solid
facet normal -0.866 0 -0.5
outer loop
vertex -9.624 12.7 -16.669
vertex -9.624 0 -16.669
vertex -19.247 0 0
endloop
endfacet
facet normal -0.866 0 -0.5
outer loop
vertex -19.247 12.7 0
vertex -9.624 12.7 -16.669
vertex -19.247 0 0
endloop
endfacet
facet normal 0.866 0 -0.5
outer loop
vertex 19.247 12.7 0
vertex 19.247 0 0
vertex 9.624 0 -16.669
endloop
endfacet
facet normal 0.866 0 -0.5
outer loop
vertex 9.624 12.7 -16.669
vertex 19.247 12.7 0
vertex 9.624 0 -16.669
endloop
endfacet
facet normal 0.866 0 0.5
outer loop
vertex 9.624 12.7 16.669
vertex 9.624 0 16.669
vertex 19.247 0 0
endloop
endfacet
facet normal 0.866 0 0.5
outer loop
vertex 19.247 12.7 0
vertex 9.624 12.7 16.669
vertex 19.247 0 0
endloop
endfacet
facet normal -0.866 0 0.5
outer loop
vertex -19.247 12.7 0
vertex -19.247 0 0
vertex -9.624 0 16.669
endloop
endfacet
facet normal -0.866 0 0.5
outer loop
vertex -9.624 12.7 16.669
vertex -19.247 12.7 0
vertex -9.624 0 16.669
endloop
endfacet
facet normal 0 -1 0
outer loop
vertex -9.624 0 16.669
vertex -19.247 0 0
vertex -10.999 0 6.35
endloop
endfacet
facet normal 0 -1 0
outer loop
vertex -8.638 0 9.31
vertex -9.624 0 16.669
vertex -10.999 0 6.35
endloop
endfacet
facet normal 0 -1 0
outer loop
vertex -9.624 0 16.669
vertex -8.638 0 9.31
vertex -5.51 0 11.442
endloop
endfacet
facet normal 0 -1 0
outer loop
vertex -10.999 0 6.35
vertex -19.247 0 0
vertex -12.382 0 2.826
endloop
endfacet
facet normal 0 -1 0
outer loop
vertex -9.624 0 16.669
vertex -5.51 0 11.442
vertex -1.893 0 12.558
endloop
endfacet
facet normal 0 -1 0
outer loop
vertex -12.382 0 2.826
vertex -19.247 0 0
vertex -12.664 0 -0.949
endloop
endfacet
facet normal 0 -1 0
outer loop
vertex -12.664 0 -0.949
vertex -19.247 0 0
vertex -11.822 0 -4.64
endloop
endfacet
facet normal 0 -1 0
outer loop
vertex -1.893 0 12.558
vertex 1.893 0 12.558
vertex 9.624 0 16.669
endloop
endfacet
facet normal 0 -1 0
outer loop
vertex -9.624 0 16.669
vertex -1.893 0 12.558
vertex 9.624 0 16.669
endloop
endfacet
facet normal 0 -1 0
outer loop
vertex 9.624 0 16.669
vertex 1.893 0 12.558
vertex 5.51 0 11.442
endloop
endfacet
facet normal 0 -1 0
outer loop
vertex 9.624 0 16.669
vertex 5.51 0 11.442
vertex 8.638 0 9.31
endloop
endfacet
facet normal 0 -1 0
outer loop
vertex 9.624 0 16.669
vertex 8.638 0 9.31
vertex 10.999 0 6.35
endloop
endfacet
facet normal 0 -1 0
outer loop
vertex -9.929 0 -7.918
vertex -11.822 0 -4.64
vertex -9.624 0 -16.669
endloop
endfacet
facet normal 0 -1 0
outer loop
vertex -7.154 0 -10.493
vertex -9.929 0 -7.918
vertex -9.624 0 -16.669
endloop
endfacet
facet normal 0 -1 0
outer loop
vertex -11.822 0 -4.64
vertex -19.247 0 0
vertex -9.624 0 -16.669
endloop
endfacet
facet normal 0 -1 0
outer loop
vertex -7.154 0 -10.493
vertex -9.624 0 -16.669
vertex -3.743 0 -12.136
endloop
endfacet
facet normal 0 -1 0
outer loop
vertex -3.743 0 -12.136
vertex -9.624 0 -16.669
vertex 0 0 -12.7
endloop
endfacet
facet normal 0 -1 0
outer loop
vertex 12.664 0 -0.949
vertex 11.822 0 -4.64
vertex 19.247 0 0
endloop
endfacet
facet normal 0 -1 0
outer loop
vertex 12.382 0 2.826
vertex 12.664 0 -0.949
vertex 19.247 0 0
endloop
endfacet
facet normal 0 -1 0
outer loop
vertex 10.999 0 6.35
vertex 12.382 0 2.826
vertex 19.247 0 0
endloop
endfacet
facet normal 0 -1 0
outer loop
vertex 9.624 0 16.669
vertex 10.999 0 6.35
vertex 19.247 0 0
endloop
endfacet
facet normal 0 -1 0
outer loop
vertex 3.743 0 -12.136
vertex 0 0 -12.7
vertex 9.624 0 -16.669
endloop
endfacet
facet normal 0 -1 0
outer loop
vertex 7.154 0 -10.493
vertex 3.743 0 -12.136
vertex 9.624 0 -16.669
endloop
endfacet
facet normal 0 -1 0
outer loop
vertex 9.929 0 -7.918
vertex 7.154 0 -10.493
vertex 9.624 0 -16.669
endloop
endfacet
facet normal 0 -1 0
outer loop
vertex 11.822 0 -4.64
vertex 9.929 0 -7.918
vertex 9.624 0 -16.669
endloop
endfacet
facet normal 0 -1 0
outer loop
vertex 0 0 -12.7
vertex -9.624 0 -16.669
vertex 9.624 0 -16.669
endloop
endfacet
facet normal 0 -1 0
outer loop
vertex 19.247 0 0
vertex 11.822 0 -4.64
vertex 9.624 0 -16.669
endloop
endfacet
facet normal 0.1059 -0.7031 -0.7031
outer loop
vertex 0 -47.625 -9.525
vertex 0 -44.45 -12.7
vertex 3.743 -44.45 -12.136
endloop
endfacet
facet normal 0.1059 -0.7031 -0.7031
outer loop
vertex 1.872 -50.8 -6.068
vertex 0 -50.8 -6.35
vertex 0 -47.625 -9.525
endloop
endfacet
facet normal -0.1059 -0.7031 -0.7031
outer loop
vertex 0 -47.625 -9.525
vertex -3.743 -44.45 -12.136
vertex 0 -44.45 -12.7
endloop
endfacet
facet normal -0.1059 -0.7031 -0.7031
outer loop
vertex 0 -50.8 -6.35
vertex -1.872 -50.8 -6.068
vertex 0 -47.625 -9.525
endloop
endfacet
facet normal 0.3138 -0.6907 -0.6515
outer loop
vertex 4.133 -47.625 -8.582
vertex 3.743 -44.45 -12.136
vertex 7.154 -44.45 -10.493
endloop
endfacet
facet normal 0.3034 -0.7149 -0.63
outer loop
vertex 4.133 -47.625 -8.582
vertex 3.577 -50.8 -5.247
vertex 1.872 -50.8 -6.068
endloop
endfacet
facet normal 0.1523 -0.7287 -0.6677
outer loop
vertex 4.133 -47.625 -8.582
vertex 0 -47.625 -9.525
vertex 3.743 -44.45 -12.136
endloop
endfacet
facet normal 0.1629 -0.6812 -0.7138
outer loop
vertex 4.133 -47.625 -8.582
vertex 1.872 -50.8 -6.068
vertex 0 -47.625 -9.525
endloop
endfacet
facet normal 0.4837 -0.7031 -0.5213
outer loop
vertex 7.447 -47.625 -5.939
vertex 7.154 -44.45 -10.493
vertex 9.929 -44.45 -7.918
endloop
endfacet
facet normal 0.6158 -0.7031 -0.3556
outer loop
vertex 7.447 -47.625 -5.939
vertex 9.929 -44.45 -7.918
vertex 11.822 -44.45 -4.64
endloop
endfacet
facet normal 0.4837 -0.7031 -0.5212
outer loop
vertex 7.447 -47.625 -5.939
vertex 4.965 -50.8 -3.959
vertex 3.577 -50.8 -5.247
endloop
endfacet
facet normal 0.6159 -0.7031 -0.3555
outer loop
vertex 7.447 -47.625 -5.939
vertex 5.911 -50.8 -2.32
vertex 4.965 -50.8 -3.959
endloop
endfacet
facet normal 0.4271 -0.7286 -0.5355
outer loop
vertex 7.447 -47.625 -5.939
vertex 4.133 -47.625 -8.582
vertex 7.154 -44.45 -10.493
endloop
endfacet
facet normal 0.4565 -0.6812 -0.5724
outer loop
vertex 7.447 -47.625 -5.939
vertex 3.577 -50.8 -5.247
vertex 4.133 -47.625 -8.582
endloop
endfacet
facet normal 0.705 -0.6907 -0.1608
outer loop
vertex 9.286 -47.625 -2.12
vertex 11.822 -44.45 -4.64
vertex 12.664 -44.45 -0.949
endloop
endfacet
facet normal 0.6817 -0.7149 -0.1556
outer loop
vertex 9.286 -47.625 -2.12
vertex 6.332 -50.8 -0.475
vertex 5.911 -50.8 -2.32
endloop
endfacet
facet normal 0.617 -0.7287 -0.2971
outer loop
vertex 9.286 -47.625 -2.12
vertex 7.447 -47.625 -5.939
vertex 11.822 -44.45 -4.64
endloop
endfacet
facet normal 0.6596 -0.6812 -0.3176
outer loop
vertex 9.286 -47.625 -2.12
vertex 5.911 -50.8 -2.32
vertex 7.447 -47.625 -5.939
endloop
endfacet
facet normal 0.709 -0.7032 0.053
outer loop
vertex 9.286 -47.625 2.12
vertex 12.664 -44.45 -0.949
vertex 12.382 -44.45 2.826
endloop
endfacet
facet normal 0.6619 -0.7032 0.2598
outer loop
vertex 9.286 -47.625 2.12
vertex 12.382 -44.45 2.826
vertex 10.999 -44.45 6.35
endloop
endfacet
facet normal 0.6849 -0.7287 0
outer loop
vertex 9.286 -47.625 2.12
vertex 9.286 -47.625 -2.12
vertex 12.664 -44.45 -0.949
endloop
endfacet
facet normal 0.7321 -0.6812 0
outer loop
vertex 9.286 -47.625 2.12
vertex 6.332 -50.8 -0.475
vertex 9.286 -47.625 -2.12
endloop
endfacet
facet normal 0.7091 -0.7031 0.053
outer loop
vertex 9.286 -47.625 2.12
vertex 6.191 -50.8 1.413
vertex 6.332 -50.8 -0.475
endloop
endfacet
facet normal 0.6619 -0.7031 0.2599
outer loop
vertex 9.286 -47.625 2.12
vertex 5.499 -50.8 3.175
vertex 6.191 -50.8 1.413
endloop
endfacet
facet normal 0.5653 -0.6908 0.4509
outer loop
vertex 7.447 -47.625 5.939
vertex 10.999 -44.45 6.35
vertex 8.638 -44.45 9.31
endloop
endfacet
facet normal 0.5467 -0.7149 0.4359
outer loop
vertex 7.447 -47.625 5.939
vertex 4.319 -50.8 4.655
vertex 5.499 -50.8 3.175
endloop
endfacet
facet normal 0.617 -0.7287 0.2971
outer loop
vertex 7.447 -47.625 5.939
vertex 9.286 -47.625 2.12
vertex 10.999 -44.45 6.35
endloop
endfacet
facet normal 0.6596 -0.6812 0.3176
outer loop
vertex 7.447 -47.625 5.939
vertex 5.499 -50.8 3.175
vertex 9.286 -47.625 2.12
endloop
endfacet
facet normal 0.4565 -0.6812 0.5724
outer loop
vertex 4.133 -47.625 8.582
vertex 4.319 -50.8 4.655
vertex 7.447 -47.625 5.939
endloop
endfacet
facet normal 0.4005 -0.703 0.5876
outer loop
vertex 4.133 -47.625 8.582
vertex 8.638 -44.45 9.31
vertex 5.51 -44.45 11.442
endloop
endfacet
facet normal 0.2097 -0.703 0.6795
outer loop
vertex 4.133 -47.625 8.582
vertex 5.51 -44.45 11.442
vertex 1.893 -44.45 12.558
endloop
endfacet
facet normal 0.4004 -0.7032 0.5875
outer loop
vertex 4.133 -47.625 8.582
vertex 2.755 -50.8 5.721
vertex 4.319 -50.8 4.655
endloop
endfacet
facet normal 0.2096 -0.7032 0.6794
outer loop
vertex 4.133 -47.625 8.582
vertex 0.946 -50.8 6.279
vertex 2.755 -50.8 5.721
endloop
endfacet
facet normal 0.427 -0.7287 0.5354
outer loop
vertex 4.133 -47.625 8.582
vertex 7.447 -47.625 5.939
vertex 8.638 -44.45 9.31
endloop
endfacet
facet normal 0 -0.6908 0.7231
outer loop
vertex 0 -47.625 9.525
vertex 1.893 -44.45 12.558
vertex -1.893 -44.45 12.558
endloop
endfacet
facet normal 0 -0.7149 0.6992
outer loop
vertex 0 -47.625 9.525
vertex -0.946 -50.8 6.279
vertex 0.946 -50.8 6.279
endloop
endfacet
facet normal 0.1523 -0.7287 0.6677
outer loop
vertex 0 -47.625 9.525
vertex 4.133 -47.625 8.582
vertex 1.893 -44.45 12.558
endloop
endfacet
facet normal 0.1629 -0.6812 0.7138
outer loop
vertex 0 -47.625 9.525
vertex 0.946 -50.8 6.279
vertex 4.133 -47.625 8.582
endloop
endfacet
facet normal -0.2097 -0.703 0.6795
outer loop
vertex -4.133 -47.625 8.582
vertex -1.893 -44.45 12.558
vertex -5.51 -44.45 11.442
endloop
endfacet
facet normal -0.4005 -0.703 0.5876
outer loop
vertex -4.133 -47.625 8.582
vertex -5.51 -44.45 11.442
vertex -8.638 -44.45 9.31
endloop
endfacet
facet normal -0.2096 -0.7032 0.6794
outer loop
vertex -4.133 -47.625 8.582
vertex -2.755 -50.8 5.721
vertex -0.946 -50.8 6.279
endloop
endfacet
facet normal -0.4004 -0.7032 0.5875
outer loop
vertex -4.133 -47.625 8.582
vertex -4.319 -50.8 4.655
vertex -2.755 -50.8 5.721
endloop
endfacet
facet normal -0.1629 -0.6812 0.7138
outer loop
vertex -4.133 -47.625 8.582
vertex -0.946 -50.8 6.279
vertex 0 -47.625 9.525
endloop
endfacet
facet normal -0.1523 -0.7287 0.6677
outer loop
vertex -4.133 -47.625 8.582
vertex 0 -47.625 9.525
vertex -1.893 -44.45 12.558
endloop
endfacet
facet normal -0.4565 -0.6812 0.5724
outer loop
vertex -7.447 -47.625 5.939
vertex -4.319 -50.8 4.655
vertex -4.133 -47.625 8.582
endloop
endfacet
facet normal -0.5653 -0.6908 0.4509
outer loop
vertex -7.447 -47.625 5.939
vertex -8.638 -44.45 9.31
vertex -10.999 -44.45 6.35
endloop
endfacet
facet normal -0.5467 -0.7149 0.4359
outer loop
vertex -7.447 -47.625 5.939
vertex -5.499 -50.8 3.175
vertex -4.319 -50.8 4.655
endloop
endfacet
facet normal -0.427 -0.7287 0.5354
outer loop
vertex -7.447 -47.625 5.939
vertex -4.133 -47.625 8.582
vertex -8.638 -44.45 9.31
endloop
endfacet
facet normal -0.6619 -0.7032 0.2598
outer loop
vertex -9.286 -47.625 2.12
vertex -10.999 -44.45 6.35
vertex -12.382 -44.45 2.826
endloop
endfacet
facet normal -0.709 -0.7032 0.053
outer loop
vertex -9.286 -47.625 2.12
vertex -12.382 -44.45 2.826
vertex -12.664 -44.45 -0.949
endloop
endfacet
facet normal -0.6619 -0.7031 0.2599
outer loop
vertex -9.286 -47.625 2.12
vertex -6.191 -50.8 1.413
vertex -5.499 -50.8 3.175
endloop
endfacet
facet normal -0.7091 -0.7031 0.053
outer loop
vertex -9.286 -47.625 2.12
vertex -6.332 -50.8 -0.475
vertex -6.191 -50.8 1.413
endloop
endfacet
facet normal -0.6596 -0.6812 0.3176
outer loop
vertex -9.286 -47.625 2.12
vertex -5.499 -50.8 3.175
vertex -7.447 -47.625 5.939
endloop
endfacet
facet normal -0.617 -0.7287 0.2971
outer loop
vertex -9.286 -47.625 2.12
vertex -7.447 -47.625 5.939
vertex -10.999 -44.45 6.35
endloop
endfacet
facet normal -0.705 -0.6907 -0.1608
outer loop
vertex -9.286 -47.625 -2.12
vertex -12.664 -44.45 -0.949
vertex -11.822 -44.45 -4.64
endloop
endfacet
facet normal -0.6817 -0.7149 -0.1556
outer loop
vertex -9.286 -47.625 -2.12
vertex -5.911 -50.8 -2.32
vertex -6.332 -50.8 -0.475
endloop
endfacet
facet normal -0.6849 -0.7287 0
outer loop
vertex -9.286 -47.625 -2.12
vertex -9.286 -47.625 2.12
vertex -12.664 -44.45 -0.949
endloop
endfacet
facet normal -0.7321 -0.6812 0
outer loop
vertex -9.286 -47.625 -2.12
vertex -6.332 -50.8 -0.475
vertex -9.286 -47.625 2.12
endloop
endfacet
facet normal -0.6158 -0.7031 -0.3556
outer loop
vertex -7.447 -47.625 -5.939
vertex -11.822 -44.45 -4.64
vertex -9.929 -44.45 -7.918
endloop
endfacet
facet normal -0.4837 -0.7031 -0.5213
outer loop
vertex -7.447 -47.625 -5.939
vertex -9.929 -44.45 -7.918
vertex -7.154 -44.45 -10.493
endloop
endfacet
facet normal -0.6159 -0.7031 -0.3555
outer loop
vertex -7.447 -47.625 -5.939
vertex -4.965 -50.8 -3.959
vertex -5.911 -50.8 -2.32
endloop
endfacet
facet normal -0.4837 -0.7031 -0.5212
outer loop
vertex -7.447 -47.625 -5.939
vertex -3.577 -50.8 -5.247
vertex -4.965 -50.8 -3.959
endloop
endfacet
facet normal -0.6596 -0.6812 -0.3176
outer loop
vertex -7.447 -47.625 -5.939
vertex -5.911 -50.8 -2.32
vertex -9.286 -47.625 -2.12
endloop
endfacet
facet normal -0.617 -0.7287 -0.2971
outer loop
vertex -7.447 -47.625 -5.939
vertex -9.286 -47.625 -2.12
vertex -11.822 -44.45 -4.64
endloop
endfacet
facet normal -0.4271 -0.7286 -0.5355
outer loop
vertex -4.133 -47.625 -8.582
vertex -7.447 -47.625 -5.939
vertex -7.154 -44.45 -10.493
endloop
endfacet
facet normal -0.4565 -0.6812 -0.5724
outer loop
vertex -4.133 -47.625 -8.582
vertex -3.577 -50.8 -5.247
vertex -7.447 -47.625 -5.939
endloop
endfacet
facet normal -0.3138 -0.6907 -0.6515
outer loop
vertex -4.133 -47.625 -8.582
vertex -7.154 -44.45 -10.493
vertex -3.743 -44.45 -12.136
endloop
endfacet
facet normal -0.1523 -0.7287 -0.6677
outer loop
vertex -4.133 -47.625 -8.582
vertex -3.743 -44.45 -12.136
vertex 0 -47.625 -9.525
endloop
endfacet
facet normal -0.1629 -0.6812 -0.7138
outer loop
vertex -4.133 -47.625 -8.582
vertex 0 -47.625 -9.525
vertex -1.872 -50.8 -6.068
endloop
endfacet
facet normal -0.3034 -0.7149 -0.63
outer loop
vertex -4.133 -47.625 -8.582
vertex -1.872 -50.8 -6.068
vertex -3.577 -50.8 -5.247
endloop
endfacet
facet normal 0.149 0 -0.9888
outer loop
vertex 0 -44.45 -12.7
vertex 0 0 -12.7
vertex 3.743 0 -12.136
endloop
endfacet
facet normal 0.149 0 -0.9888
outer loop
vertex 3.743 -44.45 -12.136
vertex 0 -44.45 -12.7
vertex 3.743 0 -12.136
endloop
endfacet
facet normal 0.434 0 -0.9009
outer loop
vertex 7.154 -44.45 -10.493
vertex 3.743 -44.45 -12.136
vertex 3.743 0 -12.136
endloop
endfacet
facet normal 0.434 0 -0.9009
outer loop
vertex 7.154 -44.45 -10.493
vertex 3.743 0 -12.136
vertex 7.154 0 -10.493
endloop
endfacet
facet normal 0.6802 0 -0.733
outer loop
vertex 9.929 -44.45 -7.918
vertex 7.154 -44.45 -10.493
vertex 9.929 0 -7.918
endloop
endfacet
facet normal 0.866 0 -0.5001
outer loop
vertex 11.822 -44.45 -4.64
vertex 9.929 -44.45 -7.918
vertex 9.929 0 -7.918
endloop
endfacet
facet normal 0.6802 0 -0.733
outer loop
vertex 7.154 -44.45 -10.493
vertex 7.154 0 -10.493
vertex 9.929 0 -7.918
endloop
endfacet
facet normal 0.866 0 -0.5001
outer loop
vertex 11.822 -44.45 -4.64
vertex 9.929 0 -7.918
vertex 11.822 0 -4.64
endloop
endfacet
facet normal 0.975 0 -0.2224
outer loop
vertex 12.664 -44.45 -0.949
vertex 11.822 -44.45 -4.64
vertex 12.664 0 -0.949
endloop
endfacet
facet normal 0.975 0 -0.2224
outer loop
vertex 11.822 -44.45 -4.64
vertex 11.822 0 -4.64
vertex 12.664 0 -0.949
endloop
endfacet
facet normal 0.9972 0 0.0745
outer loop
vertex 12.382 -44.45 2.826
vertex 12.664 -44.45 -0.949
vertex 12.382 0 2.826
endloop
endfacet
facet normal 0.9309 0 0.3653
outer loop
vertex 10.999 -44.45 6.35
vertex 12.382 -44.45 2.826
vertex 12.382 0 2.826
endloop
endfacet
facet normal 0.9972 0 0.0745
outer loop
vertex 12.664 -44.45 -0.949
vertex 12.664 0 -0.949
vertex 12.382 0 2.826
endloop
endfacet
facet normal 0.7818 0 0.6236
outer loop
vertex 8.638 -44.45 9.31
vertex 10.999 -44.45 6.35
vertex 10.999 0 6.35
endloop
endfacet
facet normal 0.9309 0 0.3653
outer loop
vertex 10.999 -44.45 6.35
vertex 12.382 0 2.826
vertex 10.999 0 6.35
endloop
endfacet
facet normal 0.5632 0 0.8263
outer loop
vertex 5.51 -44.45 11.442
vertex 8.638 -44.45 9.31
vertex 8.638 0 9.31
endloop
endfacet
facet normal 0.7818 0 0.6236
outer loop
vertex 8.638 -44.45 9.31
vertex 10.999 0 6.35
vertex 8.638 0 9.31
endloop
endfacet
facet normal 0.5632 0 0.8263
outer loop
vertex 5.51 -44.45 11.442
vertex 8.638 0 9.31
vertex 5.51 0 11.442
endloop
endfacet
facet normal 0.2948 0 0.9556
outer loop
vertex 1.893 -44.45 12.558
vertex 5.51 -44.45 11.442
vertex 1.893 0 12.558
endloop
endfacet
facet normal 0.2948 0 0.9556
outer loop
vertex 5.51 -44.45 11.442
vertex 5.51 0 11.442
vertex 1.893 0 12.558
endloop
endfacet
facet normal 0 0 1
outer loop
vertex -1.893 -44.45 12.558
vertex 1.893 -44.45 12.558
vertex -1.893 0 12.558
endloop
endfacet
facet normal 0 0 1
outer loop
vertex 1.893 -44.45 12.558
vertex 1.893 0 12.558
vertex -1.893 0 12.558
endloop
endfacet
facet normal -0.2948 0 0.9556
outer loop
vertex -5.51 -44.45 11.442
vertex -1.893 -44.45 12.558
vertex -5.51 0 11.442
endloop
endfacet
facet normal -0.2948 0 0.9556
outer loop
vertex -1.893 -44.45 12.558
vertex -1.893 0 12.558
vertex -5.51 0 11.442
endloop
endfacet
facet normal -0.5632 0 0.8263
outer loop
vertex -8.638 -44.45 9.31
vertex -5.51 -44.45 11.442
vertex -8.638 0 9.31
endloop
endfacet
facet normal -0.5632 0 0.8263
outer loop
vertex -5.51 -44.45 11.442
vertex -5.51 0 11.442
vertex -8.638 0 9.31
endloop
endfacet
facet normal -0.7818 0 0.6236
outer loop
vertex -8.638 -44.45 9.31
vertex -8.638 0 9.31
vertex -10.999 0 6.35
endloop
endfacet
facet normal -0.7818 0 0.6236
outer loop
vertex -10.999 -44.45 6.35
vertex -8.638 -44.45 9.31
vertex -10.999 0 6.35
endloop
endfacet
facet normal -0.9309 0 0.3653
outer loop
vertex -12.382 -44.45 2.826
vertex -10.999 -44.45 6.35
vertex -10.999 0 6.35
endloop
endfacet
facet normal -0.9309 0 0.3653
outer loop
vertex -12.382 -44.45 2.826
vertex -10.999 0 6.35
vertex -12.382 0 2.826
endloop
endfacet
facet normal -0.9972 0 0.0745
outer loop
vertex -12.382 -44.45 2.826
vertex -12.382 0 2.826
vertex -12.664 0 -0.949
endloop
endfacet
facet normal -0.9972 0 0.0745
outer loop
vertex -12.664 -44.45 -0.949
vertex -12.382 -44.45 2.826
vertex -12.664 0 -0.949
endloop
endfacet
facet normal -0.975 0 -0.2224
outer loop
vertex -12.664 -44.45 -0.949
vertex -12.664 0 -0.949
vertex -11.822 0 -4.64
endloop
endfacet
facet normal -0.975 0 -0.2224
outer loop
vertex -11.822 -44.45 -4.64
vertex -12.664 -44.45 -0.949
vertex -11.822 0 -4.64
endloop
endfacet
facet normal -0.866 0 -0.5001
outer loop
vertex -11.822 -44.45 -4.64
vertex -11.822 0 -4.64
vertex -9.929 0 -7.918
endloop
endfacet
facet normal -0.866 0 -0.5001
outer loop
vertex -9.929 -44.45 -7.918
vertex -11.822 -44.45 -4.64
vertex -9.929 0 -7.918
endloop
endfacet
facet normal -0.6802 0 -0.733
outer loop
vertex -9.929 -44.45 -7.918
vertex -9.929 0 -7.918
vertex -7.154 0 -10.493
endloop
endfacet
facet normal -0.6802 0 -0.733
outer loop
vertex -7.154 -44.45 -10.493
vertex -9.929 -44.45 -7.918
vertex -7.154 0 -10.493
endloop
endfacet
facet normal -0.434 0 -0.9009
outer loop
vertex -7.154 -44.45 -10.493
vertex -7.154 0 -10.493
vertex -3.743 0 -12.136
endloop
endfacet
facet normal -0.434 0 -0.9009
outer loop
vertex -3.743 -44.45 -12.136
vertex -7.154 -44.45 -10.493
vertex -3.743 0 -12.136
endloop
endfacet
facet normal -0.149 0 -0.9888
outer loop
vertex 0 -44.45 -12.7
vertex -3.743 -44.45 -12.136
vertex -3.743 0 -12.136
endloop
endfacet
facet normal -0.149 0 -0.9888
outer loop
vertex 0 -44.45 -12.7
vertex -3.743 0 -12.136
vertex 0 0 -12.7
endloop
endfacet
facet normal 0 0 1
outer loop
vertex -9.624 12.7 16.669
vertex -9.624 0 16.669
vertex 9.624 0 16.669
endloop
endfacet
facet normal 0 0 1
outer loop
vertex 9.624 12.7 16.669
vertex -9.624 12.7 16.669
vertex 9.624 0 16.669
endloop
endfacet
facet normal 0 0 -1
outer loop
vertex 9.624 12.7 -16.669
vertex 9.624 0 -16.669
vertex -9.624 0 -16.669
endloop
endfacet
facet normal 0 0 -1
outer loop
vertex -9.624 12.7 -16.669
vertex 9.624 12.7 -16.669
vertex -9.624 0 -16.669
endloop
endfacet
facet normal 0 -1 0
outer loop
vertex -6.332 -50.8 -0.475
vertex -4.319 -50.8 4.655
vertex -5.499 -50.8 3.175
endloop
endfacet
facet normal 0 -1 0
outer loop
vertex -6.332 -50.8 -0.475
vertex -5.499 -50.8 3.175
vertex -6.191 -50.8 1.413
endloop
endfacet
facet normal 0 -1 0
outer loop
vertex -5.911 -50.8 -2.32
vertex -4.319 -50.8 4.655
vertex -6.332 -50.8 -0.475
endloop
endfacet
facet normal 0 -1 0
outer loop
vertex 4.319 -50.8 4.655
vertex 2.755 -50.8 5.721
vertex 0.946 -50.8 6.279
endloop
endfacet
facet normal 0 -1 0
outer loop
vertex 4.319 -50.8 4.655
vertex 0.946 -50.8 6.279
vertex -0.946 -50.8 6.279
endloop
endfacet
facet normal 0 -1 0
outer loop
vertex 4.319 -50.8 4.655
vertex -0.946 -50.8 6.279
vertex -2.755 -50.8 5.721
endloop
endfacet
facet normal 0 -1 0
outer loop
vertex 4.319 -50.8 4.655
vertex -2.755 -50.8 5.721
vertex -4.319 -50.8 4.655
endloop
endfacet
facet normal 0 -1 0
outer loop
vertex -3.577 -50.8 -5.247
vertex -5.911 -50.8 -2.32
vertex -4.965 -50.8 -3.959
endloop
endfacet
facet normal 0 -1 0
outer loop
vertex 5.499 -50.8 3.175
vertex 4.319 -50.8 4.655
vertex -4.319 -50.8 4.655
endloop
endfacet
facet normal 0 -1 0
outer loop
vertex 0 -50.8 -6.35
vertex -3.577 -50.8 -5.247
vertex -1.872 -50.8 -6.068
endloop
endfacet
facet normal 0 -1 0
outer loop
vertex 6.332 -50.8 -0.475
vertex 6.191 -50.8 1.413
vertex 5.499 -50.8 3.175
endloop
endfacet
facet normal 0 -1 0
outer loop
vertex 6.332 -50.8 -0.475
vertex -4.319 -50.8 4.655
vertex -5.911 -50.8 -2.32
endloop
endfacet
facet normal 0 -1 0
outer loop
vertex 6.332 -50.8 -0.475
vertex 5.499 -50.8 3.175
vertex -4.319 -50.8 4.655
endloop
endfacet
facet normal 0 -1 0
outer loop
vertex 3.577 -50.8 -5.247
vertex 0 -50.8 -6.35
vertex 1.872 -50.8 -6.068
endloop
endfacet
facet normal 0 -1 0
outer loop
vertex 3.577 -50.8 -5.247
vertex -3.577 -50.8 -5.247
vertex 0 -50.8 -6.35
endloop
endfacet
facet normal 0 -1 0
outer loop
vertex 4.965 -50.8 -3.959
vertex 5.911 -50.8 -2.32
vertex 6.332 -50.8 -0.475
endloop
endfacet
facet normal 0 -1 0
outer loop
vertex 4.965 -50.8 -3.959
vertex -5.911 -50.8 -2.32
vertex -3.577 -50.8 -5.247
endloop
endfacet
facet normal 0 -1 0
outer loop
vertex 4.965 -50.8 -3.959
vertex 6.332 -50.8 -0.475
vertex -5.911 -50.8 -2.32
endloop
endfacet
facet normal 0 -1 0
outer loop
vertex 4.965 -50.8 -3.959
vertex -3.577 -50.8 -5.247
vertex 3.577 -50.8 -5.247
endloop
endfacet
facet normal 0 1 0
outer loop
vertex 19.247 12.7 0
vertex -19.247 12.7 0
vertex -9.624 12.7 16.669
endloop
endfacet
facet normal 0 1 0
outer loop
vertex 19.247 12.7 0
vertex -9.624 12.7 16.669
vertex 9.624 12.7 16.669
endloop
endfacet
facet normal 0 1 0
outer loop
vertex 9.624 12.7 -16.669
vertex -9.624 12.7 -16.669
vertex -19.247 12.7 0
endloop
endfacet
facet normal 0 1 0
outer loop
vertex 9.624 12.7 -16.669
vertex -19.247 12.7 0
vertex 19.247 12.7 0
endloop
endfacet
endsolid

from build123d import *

# Parameters (mm, degrees)
BOSS_EXTRUDE1_DEPTH = 12.7
SKETCH2_R           = 12.7
BOSS_EXTRUDE2_DEPTH = 44.45
SKETCH3_R           = 12.7
BOSS_EXTRUDE3_DEPTH = 6.35
CHAMFER1_SIZE       = 6.35


with BuildPart() as part:
    # Sketch1 → Boss-Extrude1 (new body)
    with BuildSketch(Plane(origin=(0, 0, 0), x_dir=(1, 0, 0), z_dir=(0, 1, 0))):
        Polygon((19.247414599, 0), (9.6237073, 16.66875), (-9.6237073, 16.66875), (-19.247414599, 0), (-9.6237073, -16.66875), (9.6237073, -16.66875), align=None)
    extrude(amount=BOSS_EXTRUDE1_DEPTH)

    # Sketch2 → Boss-Extrude2 (add)
    with BuildSketch(Plane.XZ):
        with Locations(Location((0, 0, 0), (0, 0, 270))):
            Circle(SKETCH2_R)
    extrude(amount=BOSS_EXTRUDE2_DEPTH)

    # Sketch3 → Boss-Extrude3 (add)
    with BuildSketch(Plane(origin=(0, -44.45, 0), x_dir=(-1, 0, 0), z_dir=(0, -1, 0))):
        with Locations(Location((0, 0, 0), (0, 0, 90))):
            Circle(SKETCH3_R)
    extrude(amount=BOSS_EXTRUDE3_DEPTH)

    # Chamfer1
    chamfer1_edges = [part.edges().sort_by_distance(p)[0] for p in [
        (0, -50.8, 12.7),
    ]]
    chamfer(chamfer1_edges, length=CHAMFER1_SIZE)


solid = part.part
